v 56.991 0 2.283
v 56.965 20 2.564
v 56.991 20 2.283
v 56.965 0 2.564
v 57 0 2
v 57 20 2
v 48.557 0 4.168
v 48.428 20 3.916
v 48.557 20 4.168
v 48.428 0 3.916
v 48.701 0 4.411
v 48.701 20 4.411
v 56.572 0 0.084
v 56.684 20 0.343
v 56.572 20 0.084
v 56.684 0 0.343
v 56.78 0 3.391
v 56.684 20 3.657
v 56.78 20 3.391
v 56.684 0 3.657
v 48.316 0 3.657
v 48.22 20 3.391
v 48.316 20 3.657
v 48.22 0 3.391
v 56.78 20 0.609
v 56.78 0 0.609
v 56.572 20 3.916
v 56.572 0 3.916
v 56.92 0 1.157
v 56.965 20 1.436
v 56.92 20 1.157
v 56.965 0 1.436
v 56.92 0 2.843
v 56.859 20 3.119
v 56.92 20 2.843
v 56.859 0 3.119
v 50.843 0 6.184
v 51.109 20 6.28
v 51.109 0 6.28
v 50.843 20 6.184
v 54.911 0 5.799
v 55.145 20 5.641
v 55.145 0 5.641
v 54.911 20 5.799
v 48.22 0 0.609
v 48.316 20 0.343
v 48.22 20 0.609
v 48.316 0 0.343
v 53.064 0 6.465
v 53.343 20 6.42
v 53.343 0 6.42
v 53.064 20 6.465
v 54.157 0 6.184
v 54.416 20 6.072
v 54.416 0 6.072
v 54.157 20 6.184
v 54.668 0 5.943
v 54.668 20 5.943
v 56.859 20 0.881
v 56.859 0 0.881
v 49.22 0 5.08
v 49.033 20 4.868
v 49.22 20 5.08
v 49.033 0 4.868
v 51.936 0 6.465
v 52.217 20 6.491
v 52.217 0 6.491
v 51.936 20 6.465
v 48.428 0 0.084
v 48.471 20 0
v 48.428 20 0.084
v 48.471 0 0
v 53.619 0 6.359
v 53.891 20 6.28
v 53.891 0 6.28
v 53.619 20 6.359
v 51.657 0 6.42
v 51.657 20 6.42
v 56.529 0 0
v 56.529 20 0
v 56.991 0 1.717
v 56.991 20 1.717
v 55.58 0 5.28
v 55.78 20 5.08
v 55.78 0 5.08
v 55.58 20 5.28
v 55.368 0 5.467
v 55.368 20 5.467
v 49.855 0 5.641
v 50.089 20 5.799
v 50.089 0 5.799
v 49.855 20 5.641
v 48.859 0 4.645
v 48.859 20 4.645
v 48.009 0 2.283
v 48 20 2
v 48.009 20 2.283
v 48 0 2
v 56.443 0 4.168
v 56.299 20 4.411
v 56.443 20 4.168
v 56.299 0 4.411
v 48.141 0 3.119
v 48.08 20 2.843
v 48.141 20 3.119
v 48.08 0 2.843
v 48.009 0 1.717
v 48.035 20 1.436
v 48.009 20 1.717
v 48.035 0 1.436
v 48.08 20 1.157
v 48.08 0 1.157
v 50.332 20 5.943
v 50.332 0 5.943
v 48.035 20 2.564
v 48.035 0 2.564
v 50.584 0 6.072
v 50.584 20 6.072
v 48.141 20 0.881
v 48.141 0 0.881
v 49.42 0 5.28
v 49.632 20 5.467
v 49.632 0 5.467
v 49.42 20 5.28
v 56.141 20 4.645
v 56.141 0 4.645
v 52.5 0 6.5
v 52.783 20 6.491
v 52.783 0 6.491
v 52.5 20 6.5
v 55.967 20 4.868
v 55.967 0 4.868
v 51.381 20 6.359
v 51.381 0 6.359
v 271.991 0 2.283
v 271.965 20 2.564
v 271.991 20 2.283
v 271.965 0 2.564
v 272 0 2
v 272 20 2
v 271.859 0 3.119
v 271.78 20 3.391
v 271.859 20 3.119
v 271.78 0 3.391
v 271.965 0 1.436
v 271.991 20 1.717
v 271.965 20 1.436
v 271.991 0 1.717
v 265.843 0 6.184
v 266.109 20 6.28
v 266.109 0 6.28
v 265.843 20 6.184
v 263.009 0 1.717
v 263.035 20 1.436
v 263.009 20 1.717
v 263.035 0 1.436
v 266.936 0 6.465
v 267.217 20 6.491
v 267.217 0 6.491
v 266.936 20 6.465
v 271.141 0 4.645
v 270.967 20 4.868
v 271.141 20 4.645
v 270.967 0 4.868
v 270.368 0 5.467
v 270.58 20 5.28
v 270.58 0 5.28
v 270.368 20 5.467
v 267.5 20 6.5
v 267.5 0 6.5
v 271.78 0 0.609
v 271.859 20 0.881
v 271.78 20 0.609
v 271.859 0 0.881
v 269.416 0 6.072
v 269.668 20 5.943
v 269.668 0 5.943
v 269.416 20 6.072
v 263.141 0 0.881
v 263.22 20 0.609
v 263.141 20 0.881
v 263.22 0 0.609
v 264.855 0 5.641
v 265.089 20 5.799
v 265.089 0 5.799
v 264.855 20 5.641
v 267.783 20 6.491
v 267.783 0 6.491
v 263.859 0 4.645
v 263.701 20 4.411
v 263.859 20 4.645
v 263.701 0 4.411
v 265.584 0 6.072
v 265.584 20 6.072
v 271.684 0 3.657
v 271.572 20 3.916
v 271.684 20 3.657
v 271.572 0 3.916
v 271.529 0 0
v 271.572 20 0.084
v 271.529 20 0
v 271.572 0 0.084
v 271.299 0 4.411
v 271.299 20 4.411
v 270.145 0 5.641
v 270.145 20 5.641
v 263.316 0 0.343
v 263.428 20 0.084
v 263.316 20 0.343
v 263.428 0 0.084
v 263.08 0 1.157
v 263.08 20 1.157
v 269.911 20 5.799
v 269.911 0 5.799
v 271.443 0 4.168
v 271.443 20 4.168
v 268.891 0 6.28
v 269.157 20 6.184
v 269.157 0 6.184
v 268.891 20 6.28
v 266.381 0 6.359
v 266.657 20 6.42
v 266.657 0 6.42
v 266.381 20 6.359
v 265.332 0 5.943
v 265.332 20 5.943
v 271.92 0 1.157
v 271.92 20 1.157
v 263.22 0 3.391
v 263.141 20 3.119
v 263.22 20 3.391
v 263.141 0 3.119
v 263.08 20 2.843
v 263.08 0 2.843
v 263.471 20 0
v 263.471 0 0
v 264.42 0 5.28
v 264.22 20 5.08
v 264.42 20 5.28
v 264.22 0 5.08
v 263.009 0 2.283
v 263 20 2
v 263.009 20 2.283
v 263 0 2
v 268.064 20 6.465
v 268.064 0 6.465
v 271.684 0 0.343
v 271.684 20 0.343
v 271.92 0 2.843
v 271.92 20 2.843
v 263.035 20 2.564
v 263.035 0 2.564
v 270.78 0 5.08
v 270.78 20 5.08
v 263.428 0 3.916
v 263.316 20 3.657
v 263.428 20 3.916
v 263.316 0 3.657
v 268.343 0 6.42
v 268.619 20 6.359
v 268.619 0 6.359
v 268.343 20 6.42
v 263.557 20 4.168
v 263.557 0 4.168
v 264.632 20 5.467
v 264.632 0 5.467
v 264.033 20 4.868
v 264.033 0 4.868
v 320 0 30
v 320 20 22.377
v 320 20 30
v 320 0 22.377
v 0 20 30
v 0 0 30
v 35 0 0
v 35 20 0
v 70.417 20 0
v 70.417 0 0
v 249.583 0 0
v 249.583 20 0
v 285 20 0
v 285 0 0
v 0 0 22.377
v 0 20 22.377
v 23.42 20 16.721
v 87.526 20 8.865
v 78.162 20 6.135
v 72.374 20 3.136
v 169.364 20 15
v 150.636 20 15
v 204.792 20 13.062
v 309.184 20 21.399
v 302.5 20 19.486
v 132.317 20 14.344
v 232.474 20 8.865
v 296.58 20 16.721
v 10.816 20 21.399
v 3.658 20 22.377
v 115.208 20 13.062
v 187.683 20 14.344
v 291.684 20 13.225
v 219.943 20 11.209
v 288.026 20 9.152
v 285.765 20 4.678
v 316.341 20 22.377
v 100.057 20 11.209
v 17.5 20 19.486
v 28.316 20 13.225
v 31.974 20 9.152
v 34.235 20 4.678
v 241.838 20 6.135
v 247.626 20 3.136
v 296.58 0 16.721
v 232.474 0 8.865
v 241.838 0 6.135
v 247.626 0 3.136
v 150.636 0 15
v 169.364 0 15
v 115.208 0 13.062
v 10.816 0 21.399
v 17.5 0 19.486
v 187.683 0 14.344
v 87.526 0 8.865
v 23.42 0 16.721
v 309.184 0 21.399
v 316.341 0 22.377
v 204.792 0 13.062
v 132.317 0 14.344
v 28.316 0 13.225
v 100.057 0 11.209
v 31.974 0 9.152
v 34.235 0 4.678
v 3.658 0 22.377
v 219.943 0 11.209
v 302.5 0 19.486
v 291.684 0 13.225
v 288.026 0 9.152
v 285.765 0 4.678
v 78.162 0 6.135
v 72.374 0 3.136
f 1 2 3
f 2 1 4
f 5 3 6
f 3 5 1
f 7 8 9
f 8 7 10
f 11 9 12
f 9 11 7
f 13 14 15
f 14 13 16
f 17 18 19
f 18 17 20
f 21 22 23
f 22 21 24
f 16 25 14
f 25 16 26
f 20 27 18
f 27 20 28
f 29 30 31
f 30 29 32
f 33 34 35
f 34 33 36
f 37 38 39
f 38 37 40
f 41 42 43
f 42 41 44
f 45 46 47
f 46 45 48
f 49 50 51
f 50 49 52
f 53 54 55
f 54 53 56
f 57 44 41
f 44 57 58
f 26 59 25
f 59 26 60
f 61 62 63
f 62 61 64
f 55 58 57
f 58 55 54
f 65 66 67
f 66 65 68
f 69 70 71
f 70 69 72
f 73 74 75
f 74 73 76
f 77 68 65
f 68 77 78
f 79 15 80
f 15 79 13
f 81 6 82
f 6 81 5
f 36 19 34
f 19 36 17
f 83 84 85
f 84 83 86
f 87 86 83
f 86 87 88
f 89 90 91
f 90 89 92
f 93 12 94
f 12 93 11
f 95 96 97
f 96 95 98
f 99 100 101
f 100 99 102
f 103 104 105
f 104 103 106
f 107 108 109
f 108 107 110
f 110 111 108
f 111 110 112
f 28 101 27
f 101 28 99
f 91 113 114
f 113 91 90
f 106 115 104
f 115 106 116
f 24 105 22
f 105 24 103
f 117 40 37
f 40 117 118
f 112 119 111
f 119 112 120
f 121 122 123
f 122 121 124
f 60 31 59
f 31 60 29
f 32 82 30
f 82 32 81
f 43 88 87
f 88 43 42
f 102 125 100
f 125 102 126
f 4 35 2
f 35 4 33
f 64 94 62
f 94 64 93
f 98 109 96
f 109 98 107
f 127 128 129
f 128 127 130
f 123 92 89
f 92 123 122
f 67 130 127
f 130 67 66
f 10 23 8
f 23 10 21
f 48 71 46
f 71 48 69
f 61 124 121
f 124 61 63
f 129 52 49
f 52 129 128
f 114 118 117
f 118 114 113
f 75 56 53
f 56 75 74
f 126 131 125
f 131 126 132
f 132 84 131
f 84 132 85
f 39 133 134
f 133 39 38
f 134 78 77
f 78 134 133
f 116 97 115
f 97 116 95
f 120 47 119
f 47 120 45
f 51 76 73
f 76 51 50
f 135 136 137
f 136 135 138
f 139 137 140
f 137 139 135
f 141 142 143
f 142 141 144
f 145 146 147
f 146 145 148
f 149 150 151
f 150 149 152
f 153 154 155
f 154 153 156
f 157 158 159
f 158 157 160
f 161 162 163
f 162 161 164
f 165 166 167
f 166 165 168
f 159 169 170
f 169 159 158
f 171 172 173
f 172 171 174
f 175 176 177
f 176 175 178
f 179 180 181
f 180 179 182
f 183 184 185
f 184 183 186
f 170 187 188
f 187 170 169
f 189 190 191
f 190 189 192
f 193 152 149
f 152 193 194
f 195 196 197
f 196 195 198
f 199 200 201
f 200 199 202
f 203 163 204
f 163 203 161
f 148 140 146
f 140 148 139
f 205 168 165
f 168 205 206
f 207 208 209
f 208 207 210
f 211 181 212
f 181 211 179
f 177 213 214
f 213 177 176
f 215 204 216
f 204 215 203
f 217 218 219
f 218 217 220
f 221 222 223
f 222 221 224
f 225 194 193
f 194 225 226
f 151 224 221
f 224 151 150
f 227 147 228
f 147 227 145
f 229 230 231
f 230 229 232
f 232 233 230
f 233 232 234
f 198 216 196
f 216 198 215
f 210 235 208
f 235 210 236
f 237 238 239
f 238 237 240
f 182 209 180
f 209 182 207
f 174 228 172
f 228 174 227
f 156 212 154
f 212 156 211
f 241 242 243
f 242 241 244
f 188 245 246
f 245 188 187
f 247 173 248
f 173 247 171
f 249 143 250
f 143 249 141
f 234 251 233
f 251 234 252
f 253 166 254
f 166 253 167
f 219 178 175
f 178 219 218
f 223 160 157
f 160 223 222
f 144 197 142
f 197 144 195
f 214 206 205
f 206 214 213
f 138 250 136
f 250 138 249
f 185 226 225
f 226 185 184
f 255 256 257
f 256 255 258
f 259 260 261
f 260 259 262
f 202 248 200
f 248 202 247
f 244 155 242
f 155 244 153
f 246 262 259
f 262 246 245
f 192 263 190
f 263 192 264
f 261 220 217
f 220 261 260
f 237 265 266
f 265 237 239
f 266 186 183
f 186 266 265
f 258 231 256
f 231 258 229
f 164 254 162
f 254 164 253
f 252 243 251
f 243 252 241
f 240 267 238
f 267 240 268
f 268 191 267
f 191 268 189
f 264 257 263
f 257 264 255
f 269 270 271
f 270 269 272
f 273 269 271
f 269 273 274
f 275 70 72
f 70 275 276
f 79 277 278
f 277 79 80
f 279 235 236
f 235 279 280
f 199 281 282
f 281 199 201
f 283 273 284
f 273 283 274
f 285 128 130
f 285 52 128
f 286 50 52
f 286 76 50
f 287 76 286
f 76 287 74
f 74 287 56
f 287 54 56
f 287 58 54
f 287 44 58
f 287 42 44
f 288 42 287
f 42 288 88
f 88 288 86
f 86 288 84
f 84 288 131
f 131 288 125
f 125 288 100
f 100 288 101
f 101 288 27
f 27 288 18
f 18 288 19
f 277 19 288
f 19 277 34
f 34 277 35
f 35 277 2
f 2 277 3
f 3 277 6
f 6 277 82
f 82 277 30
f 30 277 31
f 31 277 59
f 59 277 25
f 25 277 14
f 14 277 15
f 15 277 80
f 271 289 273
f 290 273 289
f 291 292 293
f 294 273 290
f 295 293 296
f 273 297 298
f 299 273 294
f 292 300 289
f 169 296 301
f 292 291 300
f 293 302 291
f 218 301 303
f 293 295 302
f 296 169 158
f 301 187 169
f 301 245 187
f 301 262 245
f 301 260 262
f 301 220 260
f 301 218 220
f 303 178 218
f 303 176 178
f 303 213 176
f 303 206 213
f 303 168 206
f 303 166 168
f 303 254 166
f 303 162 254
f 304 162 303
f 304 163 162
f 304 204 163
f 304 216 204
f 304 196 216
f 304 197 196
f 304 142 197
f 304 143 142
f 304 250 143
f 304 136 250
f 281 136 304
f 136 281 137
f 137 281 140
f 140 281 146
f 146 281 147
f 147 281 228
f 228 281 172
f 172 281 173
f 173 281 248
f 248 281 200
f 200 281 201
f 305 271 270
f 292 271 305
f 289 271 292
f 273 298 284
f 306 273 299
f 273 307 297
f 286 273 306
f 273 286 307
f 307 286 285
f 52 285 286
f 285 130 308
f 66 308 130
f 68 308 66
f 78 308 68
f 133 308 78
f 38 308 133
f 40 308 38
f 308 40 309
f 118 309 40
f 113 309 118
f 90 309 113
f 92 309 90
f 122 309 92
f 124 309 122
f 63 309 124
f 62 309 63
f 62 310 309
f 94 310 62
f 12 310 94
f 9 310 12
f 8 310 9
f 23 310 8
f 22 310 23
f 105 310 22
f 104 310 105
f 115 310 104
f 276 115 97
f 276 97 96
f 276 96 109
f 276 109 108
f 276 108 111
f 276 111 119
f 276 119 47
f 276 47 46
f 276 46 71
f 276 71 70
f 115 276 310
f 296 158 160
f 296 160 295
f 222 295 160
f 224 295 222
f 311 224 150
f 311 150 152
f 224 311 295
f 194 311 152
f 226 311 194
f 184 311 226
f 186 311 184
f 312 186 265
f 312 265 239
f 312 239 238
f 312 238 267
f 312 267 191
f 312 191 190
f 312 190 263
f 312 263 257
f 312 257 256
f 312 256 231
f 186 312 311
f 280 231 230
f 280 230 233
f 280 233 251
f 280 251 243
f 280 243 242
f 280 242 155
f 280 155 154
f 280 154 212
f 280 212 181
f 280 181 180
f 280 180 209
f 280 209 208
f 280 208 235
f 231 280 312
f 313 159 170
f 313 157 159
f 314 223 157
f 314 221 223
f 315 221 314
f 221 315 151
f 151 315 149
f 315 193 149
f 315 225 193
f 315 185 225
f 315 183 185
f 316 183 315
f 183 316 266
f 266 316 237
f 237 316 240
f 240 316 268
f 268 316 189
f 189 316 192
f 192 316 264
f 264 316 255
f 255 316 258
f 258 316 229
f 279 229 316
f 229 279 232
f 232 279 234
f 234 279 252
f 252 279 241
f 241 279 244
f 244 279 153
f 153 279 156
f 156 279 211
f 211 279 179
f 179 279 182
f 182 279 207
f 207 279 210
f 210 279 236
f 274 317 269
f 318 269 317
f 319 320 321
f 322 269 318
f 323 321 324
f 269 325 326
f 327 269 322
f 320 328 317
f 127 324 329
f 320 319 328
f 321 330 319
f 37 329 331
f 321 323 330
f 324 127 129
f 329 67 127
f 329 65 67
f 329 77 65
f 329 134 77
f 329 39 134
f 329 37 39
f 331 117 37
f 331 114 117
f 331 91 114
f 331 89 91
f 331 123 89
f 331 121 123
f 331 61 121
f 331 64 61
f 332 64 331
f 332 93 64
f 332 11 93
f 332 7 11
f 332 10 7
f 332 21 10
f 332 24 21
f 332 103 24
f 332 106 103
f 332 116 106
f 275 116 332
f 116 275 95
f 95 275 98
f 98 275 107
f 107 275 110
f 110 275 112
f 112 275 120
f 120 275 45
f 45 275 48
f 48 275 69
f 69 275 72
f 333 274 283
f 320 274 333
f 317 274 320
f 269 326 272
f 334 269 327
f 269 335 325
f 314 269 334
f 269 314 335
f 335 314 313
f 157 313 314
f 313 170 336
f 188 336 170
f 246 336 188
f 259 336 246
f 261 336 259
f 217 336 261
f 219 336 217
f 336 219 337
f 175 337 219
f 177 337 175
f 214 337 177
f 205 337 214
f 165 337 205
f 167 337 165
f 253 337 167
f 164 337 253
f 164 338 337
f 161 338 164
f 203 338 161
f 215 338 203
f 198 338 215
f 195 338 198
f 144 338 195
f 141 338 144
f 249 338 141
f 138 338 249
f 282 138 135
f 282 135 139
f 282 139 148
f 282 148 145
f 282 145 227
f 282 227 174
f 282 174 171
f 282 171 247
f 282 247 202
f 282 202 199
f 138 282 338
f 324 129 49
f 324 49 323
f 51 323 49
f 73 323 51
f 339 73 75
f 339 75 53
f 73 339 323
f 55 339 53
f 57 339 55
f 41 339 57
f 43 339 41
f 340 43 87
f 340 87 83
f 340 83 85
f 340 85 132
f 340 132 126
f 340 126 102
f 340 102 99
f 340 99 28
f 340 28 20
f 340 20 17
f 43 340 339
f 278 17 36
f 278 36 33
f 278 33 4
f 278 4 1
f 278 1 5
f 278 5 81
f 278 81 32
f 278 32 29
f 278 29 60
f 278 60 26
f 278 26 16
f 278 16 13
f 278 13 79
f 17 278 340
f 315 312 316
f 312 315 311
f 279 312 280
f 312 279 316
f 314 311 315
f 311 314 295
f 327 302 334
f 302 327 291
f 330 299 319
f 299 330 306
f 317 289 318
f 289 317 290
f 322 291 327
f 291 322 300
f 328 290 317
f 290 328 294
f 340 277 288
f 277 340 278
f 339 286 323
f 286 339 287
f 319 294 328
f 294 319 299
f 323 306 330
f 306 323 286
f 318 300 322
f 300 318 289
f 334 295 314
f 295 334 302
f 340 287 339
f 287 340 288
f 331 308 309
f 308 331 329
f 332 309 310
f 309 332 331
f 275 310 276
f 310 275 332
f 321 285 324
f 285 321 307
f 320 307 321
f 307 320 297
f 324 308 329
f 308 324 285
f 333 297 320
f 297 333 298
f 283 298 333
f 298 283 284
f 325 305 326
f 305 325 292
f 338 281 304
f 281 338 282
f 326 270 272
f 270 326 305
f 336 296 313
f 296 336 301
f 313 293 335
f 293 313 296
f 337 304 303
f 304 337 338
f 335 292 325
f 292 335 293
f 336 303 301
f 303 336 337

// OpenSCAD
// Keyboard bridge for pizza stand and WASD ten-keyless keyboard
// by HarlemSquirrel
// harlemsquirrel@gmail.com
// http://www.thingiverse.com/HarlemSquirrel


// *** Variables ***
// *****************

// Length of keyboard bridge
kb_length = 320; //[50:400]
// Width of keyboard bridge
kb_width = 20; //[5:50]
// Height of keyboard bridge
kb_height = 30; //[5:50]

// Pizza stand tube diameter
pstand_tube_diameter = 8; //[1:20]
// Pizza stand distance between center of bars
pstand_span = 215; //[50:300]


// *** Modules ***
// ***************

module keyboard_bridge_base() {
  difference() {
  cube([kb_length, kb_width, kb_height]);
  
  translate([((kb_length - pstand_span)/2), (kb_width + 1), 2])
    rotate([90,0,0]) {
      
        cylinder(d=(pstand_tube_diameter + 1), h=(kb_width + 2), $fn=100);
      translate([pstand_span, 0, 0])
        cylinder(d=(pstand_tube_diameter + 1), h=(kb_width + 2), $fn=100);
    }
  }
}

module end_cuttout() {
  rotate([90,0,0])
    resize([((kb_length - pstand_span)/1.5), 0, 0])
    cylinder(d=(kb_height * 1.5), h=(kb_width + 2));
}

module center_cuttout() {
  translate([(kb_length/2), (kb_width + 1), 0])
    rotate([90,0,0])
    resize([0,kb_height,0])
    cylinder(d=(pstand_span/1.2), h=(kb_width + 2));
}


// **** Main ****
// **************

difference() {
  keyboard_bridge_base();
  center_cuttout();
  translate([0, (kb_width + 1), 0])
    end_cuttout();
  translate([kb_length, (kb_width + 1), 0])
    end_cuttout();
}
